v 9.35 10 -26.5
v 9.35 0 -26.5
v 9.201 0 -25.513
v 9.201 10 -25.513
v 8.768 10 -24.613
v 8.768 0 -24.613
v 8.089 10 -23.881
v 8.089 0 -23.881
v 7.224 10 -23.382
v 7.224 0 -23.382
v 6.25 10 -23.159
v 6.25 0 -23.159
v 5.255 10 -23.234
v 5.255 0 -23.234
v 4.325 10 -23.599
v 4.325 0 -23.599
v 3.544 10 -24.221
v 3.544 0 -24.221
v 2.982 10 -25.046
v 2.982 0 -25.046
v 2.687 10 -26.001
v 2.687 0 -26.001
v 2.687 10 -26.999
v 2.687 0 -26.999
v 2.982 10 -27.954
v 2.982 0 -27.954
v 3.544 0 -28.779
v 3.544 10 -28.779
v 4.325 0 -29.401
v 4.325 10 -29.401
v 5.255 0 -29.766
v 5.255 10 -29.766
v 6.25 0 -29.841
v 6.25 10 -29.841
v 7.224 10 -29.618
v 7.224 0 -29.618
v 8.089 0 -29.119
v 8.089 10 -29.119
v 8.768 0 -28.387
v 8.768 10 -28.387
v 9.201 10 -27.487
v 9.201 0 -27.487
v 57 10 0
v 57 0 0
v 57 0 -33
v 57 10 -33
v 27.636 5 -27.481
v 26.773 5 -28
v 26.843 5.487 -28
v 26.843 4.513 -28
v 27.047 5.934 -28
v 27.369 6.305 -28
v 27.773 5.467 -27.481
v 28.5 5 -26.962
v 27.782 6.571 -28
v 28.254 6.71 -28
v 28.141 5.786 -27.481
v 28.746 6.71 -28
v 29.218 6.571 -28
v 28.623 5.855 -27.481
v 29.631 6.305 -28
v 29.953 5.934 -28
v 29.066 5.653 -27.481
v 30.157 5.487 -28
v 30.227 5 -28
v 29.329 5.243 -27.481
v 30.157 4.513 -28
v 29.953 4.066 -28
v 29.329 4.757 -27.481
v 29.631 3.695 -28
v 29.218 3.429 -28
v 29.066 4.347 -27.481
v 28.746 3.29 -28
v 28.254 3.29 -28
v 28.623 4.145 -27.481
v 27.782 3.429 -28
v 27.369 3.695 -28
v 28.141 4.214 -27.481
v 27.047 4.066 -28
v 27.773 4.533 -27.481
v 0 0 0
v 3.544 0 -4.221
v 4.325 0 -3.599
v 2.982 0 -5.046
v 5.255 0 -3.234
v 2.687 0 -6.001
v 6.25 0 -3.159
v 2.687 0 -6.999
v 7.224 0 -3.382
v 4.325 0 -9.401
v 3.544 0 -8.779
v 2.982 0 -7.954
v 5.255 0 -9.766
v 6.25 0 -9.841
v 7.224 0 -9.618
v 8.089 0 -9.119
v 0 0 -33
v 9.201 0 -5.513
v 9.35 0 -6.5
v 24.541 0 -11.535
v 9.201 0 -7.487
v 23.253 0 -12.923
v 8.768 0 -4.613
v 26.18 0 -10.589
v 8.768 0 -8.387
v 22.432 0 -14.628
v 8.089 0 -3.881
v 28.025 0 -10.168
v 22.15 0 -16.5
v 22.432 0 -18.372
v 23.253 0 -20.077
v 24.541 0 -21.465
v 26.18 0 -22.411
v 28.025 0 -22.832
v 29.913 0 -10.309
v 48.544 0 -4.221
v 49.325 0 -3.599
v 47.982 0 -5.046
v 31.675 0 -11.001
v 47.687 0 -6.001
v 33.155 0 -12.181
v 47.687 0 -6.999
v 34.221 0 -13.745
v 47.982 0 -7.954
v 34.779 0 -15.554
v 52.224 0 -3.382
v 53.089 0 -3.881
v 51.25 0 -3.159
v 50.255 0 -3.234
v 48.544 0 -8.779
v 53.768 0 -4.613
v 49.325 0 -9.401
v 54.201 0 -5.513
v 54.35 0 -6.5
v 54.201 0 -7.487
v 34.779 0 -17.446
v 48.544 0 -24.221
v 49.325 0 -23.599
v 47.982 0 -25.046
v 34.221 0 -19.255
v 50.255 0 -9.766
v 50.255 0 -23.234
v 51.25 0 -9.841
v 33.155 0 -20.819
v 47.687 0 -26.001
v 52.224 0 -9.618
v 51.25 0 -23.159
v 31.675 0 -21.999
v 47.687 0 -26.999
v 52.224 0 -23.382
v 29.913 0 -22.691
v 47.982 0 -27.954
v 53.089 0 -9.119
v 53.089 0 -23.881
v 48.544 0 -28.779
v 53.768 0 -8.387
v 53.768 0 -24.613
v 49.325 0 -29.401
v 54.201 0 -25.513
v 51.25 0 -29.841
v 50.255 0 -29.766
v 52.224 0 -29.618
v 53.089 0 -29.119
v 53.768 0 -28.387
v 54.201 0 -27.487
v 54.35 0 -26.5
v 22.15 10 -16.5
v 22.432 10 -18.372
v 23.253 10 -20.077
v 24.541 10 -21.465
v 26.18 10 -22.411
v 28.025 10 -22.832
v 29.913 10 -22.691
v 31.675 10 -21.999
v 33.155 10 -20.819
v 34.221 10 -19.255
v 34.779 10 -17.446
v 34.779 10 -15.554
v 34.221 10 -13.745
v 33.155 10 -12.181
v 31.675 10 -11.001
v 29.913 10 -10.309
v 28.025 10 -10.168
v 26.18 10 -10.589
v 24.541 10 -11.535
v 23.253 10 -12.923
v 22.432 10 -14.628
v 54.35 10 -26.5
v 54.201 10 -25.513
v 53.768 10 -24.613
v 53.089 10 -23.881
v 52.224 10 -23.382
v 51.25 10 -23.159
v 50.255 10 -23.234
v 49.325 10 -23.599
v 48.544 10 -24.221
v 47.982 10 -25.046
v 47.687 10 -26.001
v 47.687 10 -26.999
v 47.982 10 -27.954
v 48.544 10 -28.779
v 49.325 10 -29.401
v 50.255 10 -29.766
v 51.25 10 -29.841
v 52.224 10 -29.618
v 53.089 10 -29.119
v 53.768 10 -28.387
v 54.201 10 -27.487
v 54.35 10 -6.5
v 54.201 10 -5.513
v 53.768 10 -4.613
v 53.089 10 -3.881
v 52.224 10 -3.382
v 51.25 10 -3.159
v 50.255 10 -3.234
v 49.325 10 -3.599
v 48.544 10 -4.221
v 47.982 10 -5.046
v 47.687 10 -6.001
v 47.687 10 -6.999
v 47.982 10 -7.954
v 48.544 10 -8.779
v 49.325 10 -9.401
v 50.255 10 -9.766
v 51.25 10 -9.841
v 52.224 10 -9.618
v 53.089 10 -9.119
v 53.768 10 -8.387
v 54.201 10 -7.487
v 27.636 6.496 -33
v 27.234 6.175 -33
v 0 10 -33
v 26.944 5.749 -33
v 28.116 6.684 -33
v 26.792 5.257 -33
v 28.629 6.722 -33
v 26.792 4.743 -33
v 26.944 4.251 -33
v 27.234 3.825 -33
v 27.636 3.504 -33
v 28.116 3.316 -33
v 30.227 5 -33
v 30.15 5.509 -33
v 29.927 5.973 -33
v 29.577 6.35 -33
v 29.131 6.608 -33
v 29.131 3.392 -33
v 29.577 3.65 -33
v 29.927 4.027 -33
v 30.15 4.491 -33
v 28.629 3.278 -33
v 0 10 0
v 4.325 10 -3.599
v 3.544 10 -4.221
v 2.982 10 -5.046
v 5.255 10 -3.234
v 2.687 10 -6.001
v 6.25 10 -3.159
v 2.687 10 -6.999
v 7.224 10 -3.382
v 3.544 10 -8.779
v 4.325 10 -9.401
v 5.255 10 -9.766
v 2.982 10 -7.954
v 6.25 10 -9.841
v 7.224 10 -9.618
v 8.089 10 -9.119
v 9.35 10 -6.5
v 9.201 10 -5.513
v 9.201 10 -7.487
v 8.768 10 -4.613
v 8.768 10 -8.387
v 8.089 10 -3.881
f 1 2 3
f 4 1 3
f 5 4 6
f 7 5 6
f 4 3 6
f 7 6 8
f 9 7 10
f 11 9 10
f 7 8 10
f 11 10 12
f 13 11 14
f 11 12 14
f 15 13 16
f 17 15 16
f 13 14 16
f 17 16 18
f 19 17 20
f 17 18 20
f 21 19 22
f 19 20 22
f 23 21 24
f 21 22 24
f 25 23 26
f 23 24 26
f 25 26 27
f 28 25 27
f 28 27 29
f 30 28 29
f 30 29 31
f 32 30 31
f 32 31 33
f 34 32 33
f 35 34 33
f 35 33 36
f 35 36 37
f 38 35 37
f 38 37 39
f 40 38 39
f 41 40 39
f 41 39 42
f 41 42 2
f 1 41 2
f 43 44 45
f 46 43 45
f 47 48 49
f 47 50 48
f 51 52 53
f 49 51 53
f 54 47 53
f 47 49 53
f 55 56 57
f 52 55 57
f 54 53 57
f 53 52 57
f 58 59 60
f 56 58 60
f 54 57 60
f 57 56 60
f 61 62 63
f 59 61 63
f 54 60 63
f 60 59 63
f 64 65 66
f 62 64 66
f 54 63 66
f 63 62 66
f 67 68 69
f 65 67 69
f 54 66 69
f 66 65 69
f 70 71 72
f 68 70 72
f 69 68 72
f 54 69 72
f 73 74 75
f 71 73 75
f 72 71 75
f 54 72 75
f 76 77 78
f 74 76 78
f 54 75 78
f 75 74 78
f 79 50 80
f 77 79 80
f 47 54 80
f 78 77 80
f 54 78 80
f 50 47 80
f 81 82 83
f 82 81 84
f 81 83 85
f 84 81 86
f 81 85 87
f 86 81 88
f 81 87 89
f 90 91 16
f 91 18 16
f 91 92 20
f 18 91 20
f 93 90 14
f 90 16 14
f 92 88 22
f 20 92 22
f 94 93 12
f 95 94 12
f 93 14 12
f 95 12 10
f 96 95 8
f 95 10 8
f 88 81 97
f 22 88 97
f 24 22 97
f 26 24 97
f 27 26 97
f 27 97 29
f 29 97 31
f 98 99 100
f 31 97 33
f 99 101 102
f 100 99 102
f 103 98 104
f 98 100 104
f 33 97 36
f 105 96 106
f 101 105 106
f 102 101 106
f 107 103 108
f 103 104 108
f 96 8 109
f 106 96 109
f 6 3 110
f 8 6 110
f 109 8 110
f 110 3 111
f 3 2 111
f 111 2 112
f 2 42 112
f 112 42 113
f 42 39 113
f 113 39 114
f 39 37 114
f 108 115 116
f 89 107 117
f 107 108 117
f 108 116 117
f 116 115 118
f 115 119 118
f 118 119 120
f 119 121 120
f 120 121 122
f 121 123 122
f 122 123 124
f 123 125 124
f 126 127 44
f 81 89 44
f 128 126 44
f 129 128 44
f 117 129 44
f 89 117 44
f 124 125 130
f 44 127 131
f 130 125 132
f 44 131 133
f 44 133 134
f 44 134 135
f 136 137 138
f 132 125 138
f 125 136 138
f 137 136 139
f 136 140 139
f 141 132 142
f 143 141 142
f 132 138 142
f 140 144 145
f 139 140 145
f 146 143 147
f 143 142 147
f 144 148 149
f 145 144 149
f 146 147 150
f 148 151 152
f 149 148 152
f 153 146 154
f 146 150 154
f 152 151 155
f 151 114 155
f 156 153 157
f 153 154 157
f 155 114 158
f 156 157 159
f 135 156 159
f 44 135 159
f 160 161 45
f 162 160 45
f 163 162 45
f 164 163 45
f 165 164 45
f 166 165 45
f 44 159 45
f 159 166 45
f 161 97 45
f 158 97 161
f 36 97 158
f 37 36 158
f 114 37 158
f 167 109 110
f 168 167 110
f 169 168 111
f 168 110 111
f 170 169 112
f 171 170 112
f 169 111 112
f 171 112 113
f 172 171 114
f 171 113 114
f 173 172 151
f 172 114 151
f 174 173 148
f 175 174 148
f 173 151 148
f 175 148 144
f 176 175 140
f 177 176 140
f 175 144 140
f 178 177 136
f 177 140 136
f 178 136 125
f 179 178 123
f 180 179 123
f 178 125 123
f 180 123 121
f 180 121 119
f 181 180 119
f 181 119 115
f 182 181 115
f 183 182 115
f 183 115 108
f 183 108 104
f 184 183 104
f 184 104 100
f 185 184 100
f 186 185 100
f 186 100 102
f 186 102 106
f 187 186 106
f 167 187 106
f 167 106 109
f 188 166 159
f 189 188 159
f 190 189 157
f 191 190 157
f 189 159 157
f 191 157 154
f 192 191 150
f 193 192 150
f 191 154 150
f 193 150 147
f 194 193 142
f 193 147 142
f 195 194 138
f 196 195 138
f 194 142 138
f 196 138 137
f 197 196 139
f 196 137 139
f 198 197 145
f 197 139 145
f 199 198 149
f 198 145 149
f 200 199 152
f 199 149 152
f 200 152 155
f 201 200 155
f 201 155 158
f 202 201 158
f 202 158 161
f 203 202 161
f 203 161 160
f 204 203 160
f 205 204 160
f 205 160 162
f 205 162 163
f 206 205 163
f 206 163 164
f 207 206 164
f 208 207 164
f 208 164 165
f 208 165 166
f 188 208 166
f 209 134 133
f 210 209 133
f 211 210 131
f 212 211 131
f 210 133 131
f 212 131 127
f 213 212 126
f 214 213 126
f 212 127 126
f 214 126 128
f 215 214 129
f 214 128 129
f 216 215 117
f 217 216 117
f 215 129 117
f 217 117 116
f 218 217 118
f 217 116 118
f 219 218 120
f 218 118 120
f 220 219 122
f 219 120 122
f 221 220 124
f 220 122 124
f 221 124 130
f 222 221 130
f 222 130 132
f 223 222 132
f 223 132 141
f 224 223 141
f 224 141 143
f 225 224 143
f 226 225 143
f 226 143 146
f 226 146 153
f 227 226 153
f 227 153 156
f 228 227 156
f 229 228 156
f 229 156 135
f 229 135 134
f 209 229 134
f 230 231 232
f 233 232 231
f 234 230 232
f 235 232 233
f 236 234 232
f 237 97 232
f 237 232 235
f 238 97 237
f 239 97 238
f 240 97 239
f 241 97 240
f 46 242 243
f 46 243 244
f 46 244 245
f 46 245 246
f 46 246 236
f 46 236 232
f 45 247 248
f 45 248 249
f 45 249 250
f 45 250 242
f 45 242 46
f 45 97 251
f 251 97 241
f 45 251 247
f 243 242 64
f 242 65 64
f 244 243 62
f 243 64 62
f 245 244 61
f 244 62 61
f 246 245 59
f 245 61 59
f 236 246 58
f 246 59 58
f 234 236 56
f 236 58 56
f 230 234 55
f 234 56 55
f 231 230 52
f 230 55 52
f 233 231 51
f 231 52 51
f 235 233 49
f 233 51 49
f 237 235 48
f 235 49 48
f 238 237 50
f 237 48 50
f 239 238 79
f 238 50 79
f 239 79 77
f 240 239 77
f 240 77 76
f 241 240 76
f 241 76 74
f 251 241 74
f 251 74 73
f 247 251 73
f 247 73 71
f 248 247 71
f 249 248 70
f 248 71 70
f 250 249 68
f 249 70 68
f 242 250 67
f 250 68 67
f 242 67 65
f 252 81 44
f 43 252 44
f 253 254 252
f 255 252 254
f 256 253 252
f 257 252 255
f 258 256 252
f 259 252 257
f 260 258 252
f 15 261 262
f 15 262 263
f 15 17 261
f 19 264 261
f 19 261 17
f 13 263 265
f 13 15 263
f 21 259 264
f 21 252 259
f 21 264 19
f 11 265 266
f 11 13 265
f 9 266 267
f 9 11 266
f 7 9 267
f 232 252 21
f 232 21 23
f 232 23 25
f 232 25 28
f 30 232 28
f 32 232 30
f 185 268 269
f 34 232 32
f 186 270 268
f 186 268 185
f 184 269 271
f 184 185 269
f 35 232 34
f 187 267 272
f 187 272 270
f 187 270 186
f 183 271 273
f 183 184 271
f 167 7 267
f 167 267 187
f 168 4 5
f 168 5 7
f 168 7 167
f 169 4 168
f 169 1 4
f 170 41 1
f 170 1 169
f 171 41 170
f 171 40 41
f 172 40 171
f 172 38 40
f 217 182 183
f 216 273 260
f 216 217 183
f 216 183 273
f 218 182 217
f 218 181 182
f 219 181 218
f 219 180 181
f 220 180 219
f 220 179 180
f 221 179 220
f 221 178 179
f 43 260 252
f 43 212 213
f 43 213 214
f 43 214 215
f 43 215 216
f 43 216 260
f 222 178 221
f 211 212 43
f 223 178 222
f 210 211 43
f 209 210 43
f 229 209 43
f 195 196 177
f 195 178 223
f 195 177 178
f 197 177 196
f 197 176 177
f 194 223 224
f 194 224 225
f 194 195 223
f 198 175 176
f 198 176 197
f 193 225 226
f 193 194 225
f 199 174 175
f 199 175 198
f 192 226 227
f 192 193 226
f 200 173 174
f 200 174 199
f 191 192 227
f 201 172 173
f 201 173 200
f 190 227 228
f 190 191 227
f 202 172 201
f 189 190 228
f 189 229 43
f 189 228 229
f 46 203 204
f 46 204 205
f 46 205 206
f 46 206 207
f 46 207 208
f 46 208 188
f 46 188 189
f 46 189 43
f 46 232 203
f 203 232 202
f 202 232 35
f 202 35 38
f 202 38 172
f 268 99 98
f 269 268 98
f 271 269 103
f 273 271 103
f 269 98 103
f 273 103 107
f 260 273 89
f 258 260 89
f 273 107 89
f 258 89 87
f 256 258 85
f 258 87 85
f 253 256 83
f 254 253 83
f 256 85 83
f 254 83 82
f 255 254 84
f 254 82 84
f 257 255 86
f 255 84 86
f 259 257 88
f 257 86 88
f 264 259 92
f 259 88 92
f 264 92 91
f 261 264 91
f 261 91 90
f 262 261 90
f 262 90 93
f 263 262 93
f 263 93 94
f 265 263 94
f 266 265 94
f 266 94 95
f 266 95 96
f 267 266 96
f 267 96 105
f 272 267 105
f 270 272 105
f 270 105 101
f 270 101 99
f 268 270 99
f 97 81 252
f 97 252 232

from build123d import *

# Parameters (mm, degrees)
SKETCH1_W                 = 57
SKETCH1_H                 = 33
BOSS_EXTRUDE1_DEPTH       = 10
SKETCH3_R                 = 3.35
CUT_EXTRUDE1_DEPTH        = 11
SKETCH4_R                 = 3.35
CUT_EXTRUDE2_DEPTH        = 11
SKETCH10_R                = 3.35
CUT_EXTRUDE5_DEPTH        = 11
SKETCH12_R                = 3.35
CUT_EXTRUDE6_DEPTH        = 11
F_8_32_TAPPED_HOLE1_D     = 3.4544
F_8_32_TAPPED_HOLE1_DEPTH = 5
F_8_32_TAPPED_HOLE1_TIP   = 1.037806461
F_0_535_40_TAPPED_HOLE1_D = 12.7


with BuildPart() as part:
    # Sketch1 → Boss-Extrude1 (new body)
    with BuildSketch(Plane(origin=(0, 0, 0), x_dir=(1, 0, 0), z_dir=(0, 1, 0))):
        with Locations((28.5, 16.5)):
            Rectangle(SKETCH1_W, SKETCH1_H)
    extrude(amount=BOSS_EXTRUDE1_DEPTH)

    # Sketch3 → Cut-Extrude1 (cut, through all)
    with BuildSketch(Plane.XZ):
        with Locations((6, -6.5)):
            Circle(SKETCH3_R)
    extrude(amount=-CUT_EXTRUDE1_DEPTH, mode=Mode.SUBTRACT)

    # Sketch4 → Cut-Extrude2 (cut, through all)
    with BuildSketch(Plane.XZ):
        with Locations((51, -26.5)):
            Circle(SKETCH4_R)
    extrude(amount=-CUT_EXTRUDE2_DEPTH, mode=Mode.SUBTRACT)

    # Sketch10 → Cut-Extrude5 (cut, through all)
    with BuildSketch(Plane.XZ):
        with Locations((6, -26.5)):
            Circle(SKETCH10_R)
    extrude(amount=-CUT_EXTRUDE5_DEPTH, mode=Mode.SUBTRACT)

    # Sketch12 → Cut-Extrude6 (cut, through all)
    with BuildSketch(Plane.XZ):
        with Locations((51, -6.5)):
            Circle(SKETCH12_R)
    extrude(amount=-CUT_EXTRUDE6_DEPTH, mode=Mode.SUBTRACT)

    # #8-32 Tapped Hole1
    with Locations(Plane(origin=(0, 0, -33), x_dir=(-1, 0, 0), z_dir=(0, 0, -1))):
        with Locations((-28.5, 5)):
            Hole(F_8_32_TAPPED_HOLE1_D / 2, depth=F_8_32_TAPPED_HOLE1_DEPTH)
            with Locations((0, 0, -(F_8_32_TAPPED_HOLE1_DEPTH + F_8_32_TAPPED_HOLE1_TIP / 2))):  # 118° drill point
                Cone(0, F_8_32_TAPPED_HOLE1_D / 2, F_8_32_TAPPED_HOLE1_TIP, mode=Mode.SUBTRACT)

    # 0.535-40 Tapped Hole1 (through all)
    with Locations(Plane(origin=(0, 10, 0), x_dir=(1, 0, 0), z_dir=(0, 1, 0))):
        with Locations((28.5, 16.5)):
            Hole(F_0_535_40_TAPPED_HOLE1_D / 2)


solid = part.part
